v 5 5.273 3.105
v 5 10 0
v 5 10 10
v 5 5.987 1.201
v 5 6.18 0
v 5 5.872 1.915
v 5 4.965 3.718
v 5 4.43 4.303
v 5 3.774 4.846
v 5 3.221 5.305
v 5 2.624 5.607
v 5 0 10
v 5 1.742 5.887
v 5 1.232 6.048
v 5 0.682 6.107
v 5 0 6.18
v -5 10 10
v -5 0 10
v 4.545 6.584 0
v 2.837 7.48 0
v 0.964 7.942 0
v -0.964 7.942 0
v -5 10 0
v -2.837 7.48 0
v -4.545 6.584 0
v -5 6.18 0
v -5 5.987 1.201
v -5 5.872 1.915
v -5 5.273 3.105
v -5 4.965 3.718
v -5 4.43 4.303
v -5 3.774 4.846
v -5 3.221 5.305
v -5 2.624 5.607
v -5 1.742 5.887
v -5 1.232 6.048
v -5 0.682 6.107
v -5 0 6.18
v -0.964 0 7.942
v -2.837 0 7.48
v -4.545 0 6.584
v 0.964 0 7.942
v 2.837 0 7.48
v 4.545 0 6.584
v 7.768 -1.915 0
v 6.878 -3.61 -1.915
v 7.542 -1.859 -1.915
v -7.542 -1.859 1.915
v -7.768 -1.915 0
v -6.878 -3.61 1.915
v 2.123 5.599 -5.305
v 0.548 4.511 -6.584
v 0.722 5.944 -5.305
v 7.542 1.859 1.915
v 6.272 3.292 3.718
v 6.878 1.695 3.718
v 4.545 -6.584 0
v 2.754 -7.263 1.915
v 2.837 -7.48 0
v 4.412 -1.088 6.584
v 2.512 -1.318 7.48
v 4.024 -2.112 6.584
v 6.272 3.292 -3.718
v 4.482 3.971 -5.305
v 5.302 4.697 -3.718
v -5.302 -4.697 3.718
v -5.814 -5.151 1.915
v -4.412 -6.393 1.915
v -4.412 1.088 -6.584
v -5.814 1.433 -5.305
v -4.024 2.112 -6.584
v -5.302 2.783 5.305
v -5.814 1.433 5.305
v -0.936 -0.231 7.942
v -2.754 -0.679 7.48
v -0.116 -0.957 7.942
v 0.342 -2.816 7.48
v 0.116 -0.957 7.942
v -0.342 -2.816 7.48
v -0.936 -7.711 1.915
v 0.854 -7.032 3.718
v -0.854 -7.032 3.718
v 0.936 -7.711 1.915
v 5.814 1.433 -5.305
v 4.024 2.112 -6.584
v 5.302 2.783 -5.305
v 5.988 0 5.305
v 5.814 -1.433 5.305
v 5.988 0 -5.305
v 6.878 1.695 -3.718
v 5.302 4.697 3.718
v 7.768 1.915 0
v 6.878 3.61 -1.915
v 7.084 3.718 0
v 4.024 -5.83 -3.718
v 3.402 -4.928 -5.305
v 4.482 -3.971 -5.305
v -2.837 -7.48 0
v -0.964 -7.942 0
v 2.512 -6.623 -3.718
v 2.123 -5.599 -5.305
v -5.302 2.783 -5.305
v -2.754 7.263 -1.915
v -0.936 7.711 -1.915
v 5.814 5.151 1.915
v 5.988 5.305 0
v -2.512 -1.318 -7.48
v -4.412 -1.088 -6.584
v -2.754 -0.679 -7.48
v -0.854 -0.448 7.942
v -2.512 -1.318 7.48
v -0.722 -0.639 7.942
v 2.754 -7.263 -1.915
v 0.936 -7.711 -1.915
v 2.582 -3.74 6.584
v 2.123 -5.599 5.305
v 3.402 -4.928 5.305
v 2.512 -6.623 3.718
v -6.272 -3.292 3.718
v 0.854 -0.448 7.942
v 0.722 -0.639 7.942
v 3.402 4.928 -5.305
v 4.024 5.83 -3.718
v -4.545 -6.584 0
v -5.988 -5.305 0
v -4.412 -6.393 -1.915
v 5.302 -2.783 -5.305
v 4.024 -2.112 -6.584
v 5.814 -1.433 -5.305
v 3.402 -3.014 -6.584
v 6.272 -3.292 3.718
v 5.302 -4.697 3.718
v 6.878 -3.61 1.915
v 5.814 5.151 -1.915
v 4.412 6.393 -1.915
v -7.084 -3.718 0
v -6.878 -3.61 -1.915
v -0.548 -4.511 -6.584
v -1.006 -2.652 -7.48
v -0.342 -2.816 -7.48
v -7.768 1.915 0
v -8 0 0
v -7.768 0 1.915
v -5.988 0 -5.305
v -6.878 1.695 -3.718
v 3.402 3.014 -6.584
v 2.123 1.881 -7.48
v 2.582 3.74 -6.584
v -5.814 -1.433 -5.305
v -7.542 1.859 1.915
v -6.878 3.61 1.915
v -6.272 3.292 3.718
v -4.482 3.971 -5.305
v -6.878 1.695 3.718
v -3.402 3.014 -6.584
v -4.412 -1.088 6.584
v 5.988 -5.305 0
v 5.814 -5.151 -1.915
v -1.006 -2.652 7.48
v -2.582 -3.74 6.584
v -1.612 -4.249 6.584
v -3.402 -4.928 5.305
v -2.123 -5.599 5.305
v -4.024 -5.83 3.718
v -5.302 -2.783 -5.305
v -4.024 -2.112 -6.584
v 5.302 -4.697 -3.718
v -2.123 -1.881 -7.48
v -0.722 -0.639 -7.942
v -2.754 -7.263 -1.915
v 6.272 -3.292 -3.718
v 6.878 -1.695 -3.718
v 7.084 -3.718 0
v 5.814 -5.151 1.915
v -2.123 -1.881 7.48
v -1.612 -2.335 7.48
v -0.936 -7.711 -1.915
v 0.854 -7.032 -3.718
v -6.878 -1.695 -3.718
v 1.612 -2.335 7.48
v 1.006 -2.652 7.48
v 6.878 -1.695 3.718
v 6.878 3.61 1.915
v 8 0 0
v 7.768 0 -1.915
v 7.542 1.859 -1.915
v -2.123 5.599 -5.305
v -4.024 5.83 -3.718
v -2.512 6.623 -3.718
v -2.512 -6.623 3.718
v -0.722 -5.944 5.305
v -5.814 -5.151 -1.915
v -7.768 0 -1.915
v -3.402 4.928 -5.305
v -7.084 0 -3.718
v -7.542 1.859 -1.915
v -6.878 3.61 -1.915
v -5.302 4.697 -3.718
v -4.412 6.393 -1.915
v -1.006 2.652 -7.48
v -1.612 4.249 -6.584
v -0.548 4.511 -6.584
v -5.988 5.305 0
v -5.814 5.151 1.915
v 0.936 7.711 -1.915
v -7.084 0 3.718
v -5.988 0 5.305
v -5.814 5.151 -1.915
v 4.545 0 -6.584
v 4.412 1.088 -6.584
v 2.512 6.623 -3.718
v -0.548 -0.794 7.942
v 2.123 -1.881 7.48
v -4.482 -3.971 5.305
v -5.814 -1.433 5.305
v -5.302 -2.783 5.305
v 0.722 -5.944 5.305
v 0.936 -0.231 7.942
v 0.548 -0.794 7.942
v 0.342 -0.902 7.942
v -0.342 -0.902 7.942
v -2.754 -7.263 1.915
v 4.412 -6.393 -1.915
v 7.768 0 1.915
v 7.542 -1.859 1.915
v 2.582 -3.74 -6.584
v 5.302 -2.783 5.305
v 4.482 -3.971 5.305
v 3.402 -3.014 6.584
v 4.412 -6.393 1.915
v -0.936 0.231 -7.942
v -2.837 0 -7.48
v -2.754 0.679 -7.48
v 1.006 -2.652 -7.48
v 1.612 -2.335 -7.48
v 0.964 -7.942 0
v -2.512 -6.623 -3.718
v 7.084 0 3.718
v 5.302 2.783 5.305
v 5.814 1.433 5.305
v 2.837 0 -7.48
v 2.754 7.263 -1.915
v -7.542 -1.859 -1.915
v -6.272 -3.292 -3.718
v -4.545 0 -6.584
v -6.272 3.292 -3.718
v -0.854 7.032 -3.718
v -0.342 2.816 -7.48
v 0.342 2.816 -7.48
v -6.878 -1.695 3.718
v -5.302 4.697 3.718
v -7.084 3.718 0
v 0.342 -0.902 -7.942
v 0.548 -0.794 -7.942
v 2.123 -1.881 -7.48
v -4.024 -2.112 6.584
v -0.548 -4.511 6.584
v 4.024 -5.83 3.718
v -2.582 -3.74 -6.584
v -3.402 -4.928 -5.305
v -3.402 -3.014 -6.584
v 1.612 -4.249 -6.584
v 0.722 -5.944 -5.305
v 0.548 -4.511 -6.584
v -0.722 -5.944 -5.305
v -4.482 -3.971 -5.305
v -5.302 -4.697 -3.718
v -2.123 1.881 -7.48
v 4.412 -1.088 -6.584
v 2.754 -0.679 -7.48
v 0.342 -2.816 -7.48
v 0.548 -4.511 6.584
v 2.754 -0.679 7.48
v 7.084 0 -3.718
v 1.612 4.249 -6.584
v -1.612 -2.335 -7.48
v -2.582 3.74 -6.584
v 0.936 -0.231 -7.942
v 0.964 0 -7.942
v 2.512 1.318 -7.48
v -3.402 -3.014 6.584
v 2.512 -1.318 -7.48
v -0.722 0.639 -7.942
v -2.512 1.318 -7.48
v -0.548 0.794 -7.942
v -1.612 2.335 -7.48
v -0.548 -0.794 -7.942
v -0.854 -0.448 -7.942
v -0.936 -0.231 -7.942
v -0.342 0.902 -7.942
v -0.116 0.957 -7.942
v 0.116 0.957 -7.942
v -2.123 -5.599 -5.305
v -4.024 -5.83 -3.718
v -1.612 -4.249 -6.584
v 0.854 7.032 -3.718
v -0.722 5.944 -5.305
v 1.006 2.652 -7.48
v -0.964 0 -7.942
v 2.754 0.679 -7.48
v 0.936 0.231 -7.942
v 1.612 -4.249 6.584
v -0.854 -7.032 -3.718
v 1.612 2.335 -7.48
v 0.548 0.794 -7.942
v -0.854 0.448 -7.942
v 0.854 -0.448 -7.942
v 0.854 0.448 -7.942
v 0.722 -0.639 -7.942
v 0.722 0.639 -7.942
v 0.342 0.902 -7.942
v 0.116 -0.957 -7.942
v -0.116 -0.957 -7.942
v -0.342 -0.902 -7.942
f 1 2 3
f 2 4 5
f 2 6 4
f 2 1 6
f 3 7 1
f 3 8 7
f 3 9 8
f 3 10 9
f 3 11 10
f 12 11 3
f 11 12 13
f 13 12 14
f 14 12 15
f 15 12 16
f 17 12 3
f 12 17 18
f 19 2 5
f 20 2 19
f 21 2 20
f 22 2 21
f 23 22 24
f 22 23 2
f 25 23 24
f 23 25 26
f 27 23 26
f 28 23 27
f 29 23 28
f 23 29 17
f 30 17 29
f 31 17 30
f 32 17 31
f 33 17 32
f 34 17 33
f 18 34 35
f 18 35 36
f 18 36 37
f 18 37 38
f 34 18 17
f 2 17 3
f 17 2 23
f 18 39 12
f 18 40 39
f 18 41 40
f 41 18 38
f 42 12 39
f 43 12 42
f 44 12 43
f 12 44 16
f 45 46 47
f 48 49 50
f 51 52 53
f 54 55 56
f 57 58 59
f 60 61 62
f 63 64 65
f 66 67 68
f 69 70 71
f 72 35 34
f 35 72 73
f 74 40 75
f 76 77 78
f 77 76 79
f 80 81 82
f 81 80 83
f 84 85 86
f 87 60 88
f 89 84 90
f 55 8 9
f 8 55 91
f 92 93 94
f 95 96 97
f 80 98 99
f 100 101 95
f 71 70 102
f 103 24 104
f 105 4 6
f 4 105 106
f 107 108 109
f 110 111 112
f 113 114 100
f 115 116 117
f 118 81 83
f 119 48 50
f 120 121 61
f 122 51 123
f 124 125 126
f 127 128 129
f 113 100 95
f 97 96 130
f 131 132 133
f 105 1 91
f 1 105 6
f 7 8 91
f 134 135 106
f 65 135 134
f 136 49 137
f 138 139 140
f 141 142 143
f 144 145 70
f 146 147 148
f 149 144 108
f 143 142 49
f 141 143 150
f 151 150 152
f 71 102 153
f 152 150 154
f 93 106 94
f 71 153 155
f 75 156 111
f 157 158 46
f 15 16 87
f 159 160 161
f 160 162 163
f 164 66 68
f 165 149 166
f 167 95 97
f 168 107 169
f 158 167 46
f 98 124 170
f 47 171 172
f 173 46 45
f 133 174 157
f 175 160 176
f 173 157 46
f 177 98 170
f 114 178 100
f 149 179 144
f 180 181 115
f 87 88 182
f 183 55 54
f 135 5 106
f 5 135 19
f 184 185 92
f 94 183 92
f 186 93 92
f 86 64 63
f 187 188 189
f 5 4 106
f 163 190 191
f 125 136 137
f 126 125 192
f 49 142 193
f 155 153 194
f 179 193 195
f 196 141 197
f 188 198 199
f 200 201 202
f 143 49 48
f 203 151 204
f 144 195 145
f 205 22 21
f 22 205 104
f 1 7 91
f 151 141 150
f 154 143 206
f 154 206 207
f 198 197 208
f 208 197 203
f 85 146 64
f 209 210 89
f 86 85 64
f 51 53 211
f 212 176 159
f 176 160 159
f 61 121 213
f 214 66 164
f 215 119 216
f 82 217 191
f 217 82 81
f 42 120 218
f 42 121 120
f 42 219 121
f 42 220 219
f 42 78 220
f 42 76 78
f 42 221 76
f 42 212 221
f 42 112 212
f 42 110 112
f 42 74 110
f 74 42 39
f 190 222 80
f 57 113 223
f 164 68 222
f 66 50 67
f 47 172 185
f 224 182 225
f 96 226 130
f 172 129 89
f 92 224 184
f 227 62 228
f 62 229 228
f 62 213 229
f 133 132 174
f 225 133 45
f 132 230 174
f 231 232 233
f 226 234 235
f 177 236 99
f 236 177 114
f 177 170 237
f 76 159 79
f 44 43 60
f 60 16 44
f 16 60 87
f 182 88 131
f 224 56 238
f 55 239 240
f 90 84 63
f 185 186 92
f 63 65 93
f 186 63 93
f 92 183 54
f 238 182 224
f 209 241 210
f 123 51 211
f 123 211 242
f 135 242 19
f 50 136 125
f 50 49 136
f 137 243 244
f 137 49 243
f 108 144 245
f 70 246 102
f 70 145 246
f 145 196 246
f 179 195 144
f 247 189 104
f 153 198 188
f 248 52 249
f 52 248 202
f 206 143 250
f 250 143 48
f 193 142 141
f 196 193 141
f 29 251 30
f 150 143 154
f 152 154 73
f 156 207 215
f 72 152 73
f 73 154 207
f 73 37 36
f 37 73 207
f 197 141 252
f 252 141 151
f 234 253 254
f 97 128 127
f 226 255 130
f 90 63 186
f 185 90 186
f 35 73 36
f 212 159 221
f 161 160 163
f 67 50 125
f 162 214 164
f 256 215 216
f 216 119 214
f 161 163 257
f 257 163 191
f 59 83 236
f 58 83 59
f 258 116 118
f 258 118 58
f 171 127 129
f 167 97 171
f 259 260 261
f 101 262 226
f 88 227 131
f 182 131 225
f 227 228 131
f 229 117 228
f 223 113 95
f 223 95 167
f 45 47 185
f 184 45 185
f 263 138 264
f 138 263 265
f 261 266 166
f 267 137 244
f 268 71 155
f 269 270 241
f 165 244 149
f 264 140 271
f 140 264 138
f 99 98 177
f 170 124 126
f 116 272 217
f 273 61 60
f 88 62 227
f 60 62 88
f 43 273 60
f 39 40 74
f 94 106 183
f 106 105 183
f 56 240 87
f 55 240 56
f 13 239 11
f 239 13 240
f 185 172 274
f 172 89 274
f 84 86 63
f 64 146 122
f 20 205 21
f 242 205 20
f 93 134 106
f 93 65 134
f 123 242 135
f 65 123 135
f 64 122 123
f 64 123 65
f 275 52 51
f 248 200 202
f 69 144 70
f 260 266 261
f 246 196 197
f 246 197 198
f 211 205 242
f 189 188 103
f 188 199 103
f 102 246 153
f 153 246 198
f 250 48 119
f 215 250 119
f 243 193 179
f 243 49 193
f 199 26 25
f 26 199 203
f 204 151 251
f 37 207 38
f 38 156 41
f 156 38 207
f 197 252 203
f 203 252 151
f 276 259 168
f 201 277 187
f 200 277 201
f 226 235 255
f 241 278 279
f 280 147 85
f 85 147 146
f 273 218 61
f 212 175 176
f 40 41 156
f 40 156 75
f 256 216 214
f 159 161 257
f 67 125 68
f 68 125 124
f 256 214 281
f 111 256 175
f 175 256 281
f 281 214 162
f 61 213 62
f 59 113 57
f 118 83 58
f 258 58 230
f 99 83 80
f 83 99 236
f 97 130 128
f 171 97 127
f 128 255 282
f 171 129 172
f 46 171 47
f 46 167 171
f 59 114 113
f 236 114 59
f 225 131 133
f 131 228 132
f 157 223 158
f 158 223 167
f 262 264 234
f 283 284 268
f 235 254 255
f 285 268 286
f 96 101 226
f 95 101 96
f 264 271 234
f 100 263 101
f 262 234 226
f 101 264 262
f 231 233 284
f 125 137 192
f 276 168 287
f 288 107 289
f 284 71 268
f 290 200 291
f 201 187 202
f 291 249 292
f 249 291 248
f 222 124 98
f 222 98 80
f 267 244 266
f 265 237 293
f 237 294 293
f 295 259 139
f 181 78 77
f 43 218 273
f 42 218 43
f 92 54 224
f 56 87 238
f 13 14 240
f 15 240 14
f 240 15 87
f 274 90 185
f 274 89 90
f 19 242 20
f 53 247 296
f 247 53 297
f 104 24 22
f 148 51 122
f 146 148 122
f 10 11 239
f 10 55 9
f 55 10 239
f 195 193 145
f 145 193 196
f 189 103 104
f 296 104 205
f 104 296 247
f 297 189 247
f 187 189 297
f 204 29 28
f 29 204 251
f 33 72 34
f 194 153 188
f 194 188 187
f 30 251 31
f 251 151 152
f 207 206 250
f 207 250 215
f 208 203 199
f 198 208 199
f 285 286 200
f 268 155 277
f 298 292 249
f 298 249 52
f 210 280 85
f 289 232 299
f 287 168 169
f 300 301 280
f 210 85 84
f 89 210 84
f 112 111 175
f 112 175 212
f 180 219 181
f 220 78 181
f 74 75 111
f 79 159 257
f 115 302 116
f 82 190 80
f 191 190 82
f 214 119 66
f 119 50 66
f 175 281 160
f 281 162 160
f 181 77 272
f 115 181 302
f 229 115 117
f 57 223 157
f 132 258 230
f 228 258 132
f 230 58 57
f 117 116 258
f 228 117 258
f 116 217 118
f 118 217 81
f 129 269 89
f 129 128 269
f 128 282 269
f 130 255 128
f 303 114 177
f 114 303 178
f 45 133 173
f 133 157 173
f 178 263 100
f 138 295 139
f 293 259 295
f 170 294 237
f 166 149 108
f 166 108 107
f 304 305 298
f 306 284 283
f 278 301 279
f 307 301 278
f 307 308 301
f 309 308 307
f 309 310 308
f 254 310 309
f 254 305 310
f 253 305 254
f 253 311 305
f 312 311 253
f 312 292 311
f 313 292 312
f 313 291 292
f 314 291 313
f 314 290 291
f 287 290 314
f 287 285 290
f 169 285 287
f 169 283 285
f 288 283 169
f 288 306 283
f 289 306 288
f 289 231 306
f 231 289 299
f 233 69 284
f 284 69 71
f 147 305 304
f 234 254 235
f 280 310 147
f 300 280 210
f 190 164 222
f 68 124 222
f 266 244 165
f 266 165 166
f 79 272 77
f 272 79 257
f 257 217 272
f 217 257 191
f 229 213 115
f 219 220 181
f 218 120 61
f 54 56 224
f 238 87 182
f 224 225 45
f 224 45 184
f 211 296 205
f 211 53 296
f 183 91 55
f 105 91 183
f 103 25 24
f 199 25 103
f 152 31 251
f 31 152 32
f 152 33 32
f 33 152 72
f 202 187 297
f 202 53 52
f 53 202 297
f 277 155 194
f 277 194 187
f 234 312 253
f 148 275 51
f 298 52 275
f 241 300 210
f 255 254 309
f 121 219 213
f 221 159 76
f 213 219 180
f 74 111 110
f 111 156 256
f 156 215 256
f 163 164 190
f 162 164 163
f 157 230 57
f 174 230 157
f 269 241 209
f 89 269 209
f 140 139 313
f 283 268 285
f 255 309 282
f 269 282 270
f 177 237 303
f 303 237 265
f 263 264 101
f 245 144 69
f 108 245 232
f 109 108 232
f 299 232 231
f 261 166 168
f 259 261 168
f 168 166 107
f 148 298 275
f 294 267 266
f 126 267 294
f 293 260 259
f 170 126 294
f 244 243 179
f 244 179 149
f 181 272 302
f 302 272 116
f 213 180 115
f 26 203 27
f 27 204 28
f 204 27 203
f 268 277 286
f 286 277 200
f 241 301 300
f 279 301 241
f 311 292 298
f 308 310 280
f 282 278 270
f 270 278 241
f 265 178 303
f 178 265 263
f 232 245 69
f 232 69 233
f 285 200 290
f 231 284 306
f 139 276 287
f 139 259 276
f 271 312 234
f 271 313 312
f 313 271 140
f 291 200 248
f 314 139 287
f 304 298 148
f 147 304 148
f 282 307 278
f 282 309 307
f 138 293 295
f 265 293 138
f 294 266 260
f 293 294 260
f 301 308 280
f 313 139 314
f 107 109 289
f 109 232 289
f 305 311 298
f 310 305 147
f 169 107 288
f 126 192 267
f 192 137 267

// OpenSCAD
union() {
	translate(v = [-5, 0, 0]) {
		cube(size = 10);
	}
	sphere(r = 8);
}
/***********************************************
*********      SolidPython code:      **********
************************************************
 
from solid import *
from solid.utils import *  # Not required, but the utils module is useful

py_scad_obj_2 = left(5)( cube(10) ) + sphere(8)

scad_render_to_file(py_scad_obj_2, "../scad/" + __file__ + ".scad")
 
 
************************************************/
